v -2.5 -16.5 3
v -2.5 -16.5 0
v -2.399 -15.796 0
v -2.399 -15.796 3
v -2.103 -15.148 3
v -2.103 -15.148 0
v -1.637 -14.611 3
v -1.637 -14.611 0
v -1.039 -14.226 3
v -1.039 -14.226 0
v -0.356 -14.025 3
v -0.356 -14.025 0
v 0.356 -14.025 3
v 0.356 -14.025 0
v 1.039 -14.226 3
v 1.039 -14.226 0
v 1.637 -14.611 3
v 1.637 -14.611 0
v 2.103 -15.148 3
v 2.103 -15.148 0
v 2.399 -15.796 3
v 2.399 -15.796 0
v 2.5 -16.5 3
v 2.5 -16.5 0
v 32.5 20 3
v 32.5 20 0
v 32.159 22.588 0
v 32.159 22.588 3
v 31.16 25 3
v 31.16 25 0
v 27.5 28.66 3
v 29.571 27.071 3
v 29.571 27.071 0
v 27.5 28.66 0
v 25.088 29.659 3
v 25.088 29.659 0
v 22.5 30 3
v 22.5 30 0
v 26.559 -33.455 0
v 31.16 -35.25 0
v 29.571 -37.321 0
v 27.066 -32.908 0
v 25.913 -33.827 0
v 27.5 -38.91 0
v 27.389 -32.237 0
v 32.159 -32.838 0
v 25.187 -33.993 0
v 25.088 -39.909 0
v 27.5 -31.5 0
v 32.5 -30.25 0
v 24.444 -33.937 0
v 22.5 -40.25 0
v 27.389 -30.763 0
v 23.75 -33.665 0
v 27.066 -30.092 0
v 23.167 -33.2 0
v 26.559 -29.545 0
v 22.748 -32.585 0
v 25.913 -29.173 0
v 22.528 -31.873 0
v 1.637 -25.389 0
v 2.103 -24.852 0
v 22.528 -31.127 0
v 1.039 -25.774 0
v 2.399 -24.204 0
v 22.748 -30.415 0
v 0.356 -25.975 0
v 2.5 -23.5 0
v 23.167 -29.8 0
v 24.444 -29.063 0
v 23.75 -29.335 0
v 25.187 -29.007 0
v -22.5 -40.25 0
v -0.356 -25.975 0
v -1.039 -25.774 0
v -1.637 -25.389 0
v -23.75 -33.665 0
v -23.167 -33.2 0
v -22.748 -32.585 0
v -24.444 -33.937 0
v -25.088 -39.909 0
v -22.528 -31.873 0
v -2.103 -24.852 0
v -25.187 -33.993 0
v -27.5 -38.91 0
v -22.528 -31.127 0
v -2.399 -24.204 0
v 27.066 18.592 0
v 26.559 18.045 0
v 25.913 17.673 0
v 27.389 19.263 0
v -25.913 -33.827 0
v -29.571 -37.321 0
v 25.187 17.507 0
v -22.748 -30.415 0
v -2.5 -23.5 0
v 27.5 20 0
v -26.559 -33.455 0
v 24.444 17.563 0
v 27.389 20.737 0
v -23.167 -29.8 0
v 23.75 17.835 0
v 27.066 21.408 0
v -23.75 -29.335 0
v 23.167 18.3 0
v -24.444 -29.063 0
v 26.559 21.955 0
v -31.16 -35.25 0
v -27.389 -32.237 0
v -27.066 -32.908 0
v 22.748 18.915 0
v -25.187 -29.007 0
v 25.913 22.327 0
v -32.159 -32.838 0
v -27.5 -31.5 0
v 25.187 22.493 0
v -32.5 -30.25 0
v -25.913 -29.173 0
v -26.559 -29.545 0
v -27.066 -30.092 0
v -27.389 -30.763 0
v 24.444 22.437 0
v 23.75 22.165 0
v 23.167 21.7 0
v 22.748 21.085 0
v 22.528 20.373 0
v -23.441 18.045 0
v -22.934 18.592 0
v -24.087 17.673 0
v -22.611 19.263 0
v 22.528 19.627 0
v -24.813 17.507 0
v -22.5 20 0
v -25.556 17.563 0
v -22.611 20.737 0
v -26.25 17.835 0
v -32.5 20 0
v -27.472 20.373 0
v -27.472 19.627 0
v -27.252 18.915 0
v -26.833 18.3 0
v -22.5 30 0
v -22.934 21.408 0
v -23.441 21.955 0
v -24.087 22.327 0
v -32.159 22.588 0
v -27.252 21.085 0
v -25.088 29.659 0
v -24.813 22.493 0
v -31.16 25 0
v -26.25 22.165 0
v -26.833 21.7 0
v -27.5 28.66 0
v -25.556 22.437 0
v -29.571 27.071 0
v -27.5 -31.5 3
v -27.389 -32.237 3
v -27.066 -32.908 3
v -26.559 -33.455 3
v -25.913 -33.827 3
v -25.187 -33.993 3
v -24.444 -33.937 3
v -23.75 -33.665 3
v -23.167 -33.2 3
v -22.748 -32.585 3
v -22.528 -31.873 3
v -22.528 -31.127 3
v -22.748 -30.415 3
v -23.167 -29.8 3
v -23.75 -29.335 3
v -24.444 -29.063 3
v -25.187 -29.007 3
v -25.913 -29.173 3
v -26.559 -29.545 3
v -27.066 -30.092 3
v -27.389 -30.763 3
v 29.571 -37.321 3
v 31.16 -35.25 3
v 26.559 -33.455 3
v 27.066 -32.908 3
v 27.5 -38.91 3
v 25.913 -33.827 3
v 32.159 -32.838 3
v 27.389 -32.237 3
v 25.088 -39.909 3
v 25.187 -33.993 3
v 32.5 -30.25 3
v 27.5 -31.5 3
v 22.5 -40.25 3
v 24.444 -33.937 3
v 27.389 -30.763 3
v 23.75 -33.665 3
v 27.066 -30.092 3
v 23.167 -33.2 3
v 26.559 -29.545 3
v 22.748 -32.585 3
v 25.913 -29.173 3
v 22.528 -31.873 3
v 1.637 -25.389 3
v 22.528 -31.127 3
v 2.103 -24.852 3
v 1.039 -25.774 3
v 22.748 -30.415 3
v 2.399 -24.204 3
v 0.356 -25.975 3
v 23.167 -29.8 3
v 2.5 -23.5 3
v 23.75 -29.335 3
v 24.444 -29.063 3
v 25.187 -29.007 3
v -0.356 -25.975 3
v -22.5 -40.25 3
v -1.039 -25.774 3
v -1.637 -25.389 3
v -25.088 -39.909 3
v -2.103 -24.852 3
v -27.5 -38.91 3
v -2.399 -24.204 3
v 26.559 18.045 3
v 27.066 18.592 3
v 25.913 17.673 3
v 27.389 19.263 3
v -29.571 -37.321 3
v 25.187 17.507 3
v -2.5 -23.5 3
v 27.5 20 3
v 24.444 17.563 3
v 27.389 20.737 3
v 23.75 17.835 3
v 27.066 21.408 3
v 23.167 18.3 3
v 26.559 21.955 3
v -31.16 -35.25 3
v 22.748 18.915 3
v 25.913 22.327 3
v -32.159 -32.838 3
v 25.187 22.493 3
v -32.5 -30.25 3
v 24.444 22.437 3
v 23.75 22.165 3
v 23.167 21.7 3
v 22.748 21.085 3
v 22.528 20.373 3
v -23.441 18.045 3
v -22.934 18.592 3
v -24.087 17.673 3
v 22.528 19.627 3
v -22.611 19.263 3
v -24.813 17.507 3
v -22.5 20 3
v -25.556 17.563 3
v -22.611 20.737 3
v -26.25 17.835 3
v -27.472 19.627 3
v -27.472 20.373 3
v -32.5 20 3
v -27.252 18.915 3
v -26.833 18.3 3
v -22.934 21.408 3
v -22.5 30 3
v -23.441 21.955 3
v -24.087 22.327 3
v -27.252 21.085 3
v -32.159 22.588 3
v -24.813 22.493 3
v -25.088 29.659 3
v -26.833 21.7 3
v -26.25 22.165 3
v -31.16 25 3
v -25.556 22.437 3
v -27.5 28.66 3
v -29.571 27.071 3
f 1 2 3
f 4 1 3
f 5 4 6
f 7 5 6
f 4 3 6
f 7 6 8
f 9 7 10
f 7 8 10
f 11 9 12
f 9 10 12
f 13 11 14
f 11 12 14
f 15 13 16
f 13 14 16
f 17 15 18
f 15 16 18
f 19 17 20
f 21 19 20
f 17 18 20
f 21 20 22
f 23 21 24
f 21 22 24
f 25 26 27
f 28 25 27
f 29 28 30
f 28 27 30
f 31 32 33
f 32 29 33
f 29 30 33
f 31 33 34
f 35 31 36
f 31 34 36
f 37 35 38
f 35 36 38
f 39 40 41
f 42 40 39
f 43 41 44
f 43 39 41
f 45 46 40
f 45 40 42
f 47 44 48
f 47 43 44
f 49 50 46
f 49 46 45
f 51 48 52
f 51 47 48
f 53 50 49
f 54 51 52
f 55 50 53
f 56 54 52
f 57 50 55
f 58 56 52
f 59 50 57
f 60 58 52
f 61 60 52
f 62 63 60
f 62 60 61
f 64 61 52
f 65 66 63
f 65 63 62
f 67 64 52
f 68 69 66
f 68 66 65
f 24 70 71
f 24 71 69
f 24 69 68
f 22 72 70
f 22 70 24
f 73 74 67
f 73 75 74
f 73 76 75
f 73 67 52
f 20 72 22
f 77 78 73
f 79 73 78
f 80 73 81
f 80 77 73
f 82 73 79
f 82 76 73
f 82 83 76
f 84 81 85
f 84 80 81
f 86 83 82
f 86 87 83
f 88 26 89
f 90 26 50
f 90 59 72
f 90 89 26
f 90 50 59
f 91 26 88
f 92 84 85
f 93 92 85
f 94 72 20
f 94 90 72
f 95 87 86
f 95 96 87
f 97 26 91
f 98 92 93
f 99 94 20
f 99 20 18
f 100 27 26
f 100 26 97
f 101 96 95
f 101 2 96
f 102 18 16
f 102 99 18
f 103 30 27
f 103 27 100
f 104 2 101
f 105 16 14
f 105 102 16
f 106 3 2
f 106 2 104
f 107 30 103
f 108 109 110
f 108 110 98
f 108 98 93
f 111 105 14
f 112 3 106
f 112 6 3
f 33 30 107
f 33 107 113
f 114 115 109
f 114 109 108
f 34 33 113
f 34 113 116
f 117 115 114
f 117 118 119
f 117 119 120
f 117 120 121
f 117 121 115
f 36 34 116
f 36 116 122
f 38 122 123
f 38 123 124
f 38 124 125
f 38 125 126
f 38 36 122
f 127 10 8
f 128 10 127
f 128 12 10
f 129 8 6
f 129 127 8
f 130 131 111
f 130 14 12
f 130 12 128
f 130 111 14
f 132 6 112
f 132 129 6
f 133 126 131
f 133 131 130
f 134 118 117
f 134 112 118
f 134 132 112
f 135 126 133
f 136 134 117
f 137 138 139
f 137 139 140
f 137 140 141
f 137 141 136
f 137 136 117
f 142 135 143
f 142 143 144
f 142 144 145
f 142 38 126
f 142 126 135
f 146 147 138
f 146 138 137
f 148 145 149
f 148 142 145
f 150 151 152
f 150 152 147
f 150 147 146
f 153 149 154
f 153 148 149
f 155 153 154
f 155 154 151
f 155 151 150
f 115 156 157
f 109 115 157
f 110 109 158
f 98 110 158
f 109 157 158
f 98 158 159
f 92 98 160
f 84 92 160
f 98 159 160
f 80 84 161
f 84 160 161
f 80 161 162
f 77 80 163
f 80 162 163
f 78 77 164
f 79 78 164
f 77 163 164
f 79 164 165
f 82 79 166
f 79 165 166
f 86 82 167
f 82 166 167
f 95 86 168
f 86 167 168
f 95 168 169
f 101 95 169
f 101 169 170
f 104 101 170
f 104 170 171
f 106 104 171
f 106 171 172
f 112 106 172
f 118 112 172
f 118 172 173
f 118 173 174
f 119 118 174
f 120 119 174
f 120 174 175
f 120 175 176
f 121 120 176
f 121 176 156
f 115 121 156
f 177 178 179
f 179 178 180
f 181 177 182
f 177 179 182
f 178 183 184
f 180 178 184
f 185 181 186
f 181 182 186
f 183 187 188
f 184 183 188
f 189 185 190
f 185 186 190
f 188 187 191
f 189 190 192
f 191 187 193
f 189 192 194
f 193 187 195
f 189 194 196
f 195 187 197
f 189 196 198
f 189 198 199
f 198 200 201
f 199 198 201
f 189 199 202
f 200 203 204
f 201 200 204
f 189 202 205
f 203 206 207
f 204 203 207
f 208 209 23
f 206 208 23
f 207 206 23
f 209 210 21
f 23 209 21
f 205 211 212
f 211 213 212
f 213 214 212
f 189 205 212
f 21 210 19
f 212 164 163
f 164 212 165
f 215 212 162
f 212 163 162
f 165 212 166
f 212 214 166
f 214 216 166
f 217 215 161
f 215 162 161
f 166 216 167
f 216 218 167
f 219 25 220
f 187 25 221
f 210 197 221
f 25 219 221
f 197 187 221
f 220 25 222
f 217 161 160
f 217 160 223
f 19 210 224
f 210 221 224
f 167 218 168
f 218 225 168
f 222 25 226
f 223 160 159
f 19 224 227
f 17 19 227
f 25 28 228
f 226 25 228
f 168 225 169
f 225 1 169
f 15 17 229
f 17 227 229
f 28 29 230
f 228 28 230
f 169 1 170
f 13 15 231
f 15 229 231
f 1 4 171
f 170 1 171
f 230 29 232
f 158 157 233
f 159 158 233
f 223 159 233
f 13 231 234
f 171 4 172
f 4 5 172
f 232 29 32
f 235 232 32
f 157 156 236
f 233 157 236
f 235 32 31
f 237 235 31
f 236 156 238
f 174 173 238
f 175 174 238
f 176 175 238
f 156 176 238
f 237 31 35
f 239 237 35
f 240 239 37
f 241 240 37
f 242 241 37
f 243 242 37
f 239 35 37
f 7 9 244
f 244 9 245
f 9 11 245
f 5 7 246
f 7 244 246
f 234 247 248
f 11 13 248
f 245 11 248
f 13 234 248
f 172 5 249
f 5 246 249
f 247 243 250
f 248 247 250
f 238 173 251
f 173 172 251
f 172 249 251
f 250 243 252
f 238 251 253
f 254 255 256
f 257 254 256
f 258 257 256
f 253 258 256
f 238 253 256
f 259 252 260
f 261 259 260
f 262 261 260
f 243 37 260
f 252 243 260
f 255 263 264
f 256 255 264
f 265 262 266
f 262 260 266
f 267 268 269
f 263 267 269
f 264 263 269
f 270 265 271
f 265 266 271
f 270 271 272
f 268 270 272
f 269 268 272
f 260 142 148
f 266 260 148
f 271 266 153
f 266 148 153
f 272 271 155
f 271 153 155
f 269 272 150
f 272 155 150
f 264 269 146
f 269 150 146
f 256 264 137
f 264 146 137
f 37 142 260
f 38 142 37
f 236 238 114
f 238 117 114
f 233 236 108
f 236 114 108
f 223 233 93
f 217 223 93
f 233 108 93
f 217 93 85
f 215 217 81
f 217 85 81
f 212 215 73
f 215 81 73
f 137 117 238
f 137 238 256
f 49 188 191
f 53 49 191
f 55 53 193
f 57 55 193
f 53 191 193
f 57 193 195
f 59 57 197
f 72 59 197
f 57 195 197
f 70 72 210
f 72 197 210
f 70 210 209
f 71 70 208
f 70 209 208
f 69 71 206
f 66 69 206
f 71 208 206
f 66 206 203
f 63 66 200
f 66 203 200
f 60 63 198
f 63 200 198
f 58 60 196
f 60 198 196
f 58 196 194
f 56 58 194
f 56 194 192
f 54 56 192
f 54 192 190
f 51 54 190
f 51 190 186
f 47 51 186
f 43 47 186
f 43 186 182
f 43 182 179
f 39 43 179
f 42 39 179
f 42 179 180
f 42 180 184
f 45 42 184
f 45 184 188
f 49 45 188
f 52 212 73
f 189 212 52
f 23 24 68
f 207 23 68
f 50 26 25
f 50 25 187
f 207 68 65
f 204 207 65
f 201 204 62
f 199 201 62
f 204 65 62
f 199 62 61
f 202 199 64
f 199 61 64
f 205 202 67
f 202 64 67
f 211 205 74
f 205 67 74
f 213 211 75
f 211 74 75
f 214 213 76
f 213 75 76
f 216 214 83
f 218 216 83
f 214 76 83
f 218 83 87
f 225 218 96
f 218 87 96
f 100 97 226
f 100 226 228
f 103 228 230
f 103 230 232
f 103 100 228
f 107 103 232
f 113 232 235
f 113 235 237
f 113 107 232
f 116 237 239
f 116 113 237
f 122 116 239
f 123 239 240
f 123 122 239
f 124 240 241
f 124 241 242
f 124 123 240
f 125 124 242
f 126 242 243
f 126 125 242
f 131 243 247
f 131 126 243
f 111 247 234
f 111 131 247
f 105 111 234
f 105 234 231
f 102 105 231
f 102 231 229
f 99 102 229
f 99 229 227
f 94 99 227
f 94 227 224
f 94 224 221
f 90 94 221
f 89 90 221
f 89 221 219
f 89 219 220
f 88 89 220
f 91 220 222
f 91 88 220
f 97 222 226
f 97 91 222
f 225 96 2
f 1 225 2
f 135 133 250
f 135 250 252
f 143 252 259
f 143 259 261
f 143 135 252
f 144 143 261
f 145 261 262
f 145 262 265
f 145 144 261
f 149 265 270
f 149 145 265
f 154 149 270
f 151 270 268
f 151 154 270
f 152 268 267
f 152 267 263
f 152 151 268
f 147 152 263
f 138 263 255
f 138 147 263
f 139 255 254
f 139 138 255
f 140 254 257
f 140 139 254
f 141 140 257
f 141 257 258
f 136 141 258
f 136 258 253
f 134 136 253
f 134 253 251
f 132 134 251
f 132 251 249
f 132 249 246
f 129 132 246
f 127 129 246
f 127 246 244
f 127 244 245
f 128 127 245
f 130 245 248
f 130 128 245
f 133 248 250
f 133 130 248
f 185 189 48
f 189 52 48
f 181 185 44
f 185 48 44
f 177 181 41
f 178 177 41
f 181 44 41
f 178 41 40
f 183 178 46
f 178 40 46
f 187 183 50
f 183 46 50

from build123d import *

# Parameters (mm, degrees)
SKETCH1_R           = 2.5
BOSS_EXTRUDE1_DEPTH = 3
FILLET1_R           = 10
FILLET1_R_2         = 15
FILLET1_R_3         = 50
SKETCH2_R           = 1.75
SKETCH2_R_2         = 12
CUT_EXTRUDE1_DEPTH  = 82.389898264
SKETCH4_W           = 65
SKETCH4_H           = 34.30914122
CUT_EXTRUDE2_DEPTH  = 82.389898264
FILLET2_R           = 10
SKETCH5_R           = 2.5
CUT_EXTRUDE3_DEPTH  = 52.820000965


with BuildPart() as part:
    # Sketch1 → Boss-Extrude1 (new body)
    with BuildSketch(Plane.XY):
        Polygon((-32.5, 30), (32.5, 30), (32.5, -62.640754554), (0, -87.640754554), (-32.5, -62.640754554), align=None)
        with Locations((25, 20)):
            Circle(SKETCH1_R, mode=Mode.SUBTRACT)
        with Locations((-25, 20)):
            Circle(SKETCH1_R, mode=Mode.SUBTRACT)
        with BuildLine():
            Line((2.5, -16.5), (2.5, -23.5))
            ThreePointArc((2.5, -23.5), (0, -26), (-2.5, -23.5))
            Line((-2.5, -23.5), (-2.5, -16.5))
            ThreePointArc((-2.5, -16.5), (0, -14), (2.5, -16.5))
        make_face(mode=Mode.SUBTRACT)
    extrude(amount=BOSS_EXTRUDE1_DEPTH)

    # Fillet1
    # the kernel refuses this fillet: 50, 15, 10 mm, written as the material it takes off along each edge
    with BuildSketch(Plane(origin=(32.5, 30, -25), x_dir=(-1, 0, 0), z_dir=(0, 0, 1))) as fillet1_piece_1:
        with BuildLine():
            CenterArc((FILLET1_R, FILLET1_R), FILLET1_R, 180, 90)
            Line((0, FILLET1_R), (0, 0))
            Line((0, 0), (FILLET1_R, 0))
        make_face()
    extrude(amount=53, mode=Mode.SUBTRACT)
    with BuildSketch(Plane(origin=(-32.5, 30, -25), x_dir=(1, 0, 0), z_dir=(0, 0, 1))) as fillet1_piece_2:
        with BuildLine():
            CenterArc((FILLET1_R, -FILLET1_R), FILLET1_R, 90, 90)
            Line((0, -FILLET1_R), (0, 0))
            Line((0, 0), (FILLET1_R, 0))
        make_face()
    extrude(amount=53, mode=Mode.SUBTRACT)
    with BuildSketch(Plane(origin=(-32.5, -62.640754554, -18.465056154), x_dir=(0.7926239891046004, -0.6097107608496921, 0), z_dir=(0, 0, 1)), Plane(origin=(32.5, -62.640754554, -18.465056154), x_dir=(0, 1, 0), z_dir=(0, 0, 1))) as fillet1_piece_3:
        with BuildLine():
            CenterArc((FILLET1_R_2 * 0.492401497451, FILLET1_R_2), FILLET1_R_2, 217.568592029, 52.431407971)
            Line((-FILLET1_R_2 * 0.300222491654, FILLET1_R_2 * 0.39028923915), (0, 0))
            Line((0, 0), (FILLET1_R_2 * 0.492401497451, 0))
        make_face()
    extrude(amount=39.930112309, mode=Mode.SUBTRACT)
    with BuildSketch(Plane(origin=(0, -87.640754554, -96.153846154), x_dir=(0.7926239891046001, 0.6097107608496922, 0), z_dir=(0, 0, 1))) as fillet1_piece_4:
        with BuildLine():
            CenterArc((FILLET1_R_3 * 0.769230769231, FILLET1_R_3), FILLET1_R_3, 194.862815942, 75.137184058)
            Line((-FILLET1_R_3 * 0.197311981699, FILLET1_R_3 * 0.743494423792), (0, 0))
            Line((0, 0), (FILLET1_R_3 * 0.769230769231, 0))
        make_face()
    extrude(amount=195.307692308, mode=Mode.SUBTRACT)

    # Sketch2 → Cut-Extrude1 (cut, through all)
    with BuildSketch(Plane.XY.offset(3)):
        with Locations((12, -42)):
            Circle(SKETCH2_R)
        with Locations((-12, -42)):
            Circle(SKETCH2_R)
        with Locations((-12, -66)):
            Circle(SKETCH2_R)
        with Locations((12, -66)):
            Circle(SKETCH2_R)
        with Locations((0, -54)):
            Circle(SKETCH2_R_2)
    extrude(amount=-CUT_EXTRUDE1_DEPTH, mode=Mode.SUBTRACT)

    # Sketch4 → Cut-Extrude2 (cut, through all)
    with BuildSketch(Plane.XY.offset(3)):
        with Locations((0, -57.40457061)):
            Rectangle(SKETCH4_W, SKETCH4_H)
    extrude(amount=-CUT_EXTRUDE2_DEPTH, mode=Mode.SUBTRACT)

    # Fillet2
    fillet2_edges = [part.edges().sort_by_distance(p)[0] for p in [
        (-32.5, -40.25, 1.5),
        (32.5, -40.25, 1.5),
    ]]
    fillet(fillet2_edges, radius=FILLET2_R)

    # Sketch5 → Cut-Extrude3 (cut, through all)
    with BuildSketch(Plane.XY.offset(3)):
        with Locations((25, -31.5)):
            Circle(SKETCH5_R)
        with Locations(Location((-25, -31.5, 0), (0, 0, 180))):
            Circle(SKETCH5_R)
    extrude(amount=-CUT_EXTRUDE3_DEPTH, mode=Mode.SUBTRACT)


solid = part.part
